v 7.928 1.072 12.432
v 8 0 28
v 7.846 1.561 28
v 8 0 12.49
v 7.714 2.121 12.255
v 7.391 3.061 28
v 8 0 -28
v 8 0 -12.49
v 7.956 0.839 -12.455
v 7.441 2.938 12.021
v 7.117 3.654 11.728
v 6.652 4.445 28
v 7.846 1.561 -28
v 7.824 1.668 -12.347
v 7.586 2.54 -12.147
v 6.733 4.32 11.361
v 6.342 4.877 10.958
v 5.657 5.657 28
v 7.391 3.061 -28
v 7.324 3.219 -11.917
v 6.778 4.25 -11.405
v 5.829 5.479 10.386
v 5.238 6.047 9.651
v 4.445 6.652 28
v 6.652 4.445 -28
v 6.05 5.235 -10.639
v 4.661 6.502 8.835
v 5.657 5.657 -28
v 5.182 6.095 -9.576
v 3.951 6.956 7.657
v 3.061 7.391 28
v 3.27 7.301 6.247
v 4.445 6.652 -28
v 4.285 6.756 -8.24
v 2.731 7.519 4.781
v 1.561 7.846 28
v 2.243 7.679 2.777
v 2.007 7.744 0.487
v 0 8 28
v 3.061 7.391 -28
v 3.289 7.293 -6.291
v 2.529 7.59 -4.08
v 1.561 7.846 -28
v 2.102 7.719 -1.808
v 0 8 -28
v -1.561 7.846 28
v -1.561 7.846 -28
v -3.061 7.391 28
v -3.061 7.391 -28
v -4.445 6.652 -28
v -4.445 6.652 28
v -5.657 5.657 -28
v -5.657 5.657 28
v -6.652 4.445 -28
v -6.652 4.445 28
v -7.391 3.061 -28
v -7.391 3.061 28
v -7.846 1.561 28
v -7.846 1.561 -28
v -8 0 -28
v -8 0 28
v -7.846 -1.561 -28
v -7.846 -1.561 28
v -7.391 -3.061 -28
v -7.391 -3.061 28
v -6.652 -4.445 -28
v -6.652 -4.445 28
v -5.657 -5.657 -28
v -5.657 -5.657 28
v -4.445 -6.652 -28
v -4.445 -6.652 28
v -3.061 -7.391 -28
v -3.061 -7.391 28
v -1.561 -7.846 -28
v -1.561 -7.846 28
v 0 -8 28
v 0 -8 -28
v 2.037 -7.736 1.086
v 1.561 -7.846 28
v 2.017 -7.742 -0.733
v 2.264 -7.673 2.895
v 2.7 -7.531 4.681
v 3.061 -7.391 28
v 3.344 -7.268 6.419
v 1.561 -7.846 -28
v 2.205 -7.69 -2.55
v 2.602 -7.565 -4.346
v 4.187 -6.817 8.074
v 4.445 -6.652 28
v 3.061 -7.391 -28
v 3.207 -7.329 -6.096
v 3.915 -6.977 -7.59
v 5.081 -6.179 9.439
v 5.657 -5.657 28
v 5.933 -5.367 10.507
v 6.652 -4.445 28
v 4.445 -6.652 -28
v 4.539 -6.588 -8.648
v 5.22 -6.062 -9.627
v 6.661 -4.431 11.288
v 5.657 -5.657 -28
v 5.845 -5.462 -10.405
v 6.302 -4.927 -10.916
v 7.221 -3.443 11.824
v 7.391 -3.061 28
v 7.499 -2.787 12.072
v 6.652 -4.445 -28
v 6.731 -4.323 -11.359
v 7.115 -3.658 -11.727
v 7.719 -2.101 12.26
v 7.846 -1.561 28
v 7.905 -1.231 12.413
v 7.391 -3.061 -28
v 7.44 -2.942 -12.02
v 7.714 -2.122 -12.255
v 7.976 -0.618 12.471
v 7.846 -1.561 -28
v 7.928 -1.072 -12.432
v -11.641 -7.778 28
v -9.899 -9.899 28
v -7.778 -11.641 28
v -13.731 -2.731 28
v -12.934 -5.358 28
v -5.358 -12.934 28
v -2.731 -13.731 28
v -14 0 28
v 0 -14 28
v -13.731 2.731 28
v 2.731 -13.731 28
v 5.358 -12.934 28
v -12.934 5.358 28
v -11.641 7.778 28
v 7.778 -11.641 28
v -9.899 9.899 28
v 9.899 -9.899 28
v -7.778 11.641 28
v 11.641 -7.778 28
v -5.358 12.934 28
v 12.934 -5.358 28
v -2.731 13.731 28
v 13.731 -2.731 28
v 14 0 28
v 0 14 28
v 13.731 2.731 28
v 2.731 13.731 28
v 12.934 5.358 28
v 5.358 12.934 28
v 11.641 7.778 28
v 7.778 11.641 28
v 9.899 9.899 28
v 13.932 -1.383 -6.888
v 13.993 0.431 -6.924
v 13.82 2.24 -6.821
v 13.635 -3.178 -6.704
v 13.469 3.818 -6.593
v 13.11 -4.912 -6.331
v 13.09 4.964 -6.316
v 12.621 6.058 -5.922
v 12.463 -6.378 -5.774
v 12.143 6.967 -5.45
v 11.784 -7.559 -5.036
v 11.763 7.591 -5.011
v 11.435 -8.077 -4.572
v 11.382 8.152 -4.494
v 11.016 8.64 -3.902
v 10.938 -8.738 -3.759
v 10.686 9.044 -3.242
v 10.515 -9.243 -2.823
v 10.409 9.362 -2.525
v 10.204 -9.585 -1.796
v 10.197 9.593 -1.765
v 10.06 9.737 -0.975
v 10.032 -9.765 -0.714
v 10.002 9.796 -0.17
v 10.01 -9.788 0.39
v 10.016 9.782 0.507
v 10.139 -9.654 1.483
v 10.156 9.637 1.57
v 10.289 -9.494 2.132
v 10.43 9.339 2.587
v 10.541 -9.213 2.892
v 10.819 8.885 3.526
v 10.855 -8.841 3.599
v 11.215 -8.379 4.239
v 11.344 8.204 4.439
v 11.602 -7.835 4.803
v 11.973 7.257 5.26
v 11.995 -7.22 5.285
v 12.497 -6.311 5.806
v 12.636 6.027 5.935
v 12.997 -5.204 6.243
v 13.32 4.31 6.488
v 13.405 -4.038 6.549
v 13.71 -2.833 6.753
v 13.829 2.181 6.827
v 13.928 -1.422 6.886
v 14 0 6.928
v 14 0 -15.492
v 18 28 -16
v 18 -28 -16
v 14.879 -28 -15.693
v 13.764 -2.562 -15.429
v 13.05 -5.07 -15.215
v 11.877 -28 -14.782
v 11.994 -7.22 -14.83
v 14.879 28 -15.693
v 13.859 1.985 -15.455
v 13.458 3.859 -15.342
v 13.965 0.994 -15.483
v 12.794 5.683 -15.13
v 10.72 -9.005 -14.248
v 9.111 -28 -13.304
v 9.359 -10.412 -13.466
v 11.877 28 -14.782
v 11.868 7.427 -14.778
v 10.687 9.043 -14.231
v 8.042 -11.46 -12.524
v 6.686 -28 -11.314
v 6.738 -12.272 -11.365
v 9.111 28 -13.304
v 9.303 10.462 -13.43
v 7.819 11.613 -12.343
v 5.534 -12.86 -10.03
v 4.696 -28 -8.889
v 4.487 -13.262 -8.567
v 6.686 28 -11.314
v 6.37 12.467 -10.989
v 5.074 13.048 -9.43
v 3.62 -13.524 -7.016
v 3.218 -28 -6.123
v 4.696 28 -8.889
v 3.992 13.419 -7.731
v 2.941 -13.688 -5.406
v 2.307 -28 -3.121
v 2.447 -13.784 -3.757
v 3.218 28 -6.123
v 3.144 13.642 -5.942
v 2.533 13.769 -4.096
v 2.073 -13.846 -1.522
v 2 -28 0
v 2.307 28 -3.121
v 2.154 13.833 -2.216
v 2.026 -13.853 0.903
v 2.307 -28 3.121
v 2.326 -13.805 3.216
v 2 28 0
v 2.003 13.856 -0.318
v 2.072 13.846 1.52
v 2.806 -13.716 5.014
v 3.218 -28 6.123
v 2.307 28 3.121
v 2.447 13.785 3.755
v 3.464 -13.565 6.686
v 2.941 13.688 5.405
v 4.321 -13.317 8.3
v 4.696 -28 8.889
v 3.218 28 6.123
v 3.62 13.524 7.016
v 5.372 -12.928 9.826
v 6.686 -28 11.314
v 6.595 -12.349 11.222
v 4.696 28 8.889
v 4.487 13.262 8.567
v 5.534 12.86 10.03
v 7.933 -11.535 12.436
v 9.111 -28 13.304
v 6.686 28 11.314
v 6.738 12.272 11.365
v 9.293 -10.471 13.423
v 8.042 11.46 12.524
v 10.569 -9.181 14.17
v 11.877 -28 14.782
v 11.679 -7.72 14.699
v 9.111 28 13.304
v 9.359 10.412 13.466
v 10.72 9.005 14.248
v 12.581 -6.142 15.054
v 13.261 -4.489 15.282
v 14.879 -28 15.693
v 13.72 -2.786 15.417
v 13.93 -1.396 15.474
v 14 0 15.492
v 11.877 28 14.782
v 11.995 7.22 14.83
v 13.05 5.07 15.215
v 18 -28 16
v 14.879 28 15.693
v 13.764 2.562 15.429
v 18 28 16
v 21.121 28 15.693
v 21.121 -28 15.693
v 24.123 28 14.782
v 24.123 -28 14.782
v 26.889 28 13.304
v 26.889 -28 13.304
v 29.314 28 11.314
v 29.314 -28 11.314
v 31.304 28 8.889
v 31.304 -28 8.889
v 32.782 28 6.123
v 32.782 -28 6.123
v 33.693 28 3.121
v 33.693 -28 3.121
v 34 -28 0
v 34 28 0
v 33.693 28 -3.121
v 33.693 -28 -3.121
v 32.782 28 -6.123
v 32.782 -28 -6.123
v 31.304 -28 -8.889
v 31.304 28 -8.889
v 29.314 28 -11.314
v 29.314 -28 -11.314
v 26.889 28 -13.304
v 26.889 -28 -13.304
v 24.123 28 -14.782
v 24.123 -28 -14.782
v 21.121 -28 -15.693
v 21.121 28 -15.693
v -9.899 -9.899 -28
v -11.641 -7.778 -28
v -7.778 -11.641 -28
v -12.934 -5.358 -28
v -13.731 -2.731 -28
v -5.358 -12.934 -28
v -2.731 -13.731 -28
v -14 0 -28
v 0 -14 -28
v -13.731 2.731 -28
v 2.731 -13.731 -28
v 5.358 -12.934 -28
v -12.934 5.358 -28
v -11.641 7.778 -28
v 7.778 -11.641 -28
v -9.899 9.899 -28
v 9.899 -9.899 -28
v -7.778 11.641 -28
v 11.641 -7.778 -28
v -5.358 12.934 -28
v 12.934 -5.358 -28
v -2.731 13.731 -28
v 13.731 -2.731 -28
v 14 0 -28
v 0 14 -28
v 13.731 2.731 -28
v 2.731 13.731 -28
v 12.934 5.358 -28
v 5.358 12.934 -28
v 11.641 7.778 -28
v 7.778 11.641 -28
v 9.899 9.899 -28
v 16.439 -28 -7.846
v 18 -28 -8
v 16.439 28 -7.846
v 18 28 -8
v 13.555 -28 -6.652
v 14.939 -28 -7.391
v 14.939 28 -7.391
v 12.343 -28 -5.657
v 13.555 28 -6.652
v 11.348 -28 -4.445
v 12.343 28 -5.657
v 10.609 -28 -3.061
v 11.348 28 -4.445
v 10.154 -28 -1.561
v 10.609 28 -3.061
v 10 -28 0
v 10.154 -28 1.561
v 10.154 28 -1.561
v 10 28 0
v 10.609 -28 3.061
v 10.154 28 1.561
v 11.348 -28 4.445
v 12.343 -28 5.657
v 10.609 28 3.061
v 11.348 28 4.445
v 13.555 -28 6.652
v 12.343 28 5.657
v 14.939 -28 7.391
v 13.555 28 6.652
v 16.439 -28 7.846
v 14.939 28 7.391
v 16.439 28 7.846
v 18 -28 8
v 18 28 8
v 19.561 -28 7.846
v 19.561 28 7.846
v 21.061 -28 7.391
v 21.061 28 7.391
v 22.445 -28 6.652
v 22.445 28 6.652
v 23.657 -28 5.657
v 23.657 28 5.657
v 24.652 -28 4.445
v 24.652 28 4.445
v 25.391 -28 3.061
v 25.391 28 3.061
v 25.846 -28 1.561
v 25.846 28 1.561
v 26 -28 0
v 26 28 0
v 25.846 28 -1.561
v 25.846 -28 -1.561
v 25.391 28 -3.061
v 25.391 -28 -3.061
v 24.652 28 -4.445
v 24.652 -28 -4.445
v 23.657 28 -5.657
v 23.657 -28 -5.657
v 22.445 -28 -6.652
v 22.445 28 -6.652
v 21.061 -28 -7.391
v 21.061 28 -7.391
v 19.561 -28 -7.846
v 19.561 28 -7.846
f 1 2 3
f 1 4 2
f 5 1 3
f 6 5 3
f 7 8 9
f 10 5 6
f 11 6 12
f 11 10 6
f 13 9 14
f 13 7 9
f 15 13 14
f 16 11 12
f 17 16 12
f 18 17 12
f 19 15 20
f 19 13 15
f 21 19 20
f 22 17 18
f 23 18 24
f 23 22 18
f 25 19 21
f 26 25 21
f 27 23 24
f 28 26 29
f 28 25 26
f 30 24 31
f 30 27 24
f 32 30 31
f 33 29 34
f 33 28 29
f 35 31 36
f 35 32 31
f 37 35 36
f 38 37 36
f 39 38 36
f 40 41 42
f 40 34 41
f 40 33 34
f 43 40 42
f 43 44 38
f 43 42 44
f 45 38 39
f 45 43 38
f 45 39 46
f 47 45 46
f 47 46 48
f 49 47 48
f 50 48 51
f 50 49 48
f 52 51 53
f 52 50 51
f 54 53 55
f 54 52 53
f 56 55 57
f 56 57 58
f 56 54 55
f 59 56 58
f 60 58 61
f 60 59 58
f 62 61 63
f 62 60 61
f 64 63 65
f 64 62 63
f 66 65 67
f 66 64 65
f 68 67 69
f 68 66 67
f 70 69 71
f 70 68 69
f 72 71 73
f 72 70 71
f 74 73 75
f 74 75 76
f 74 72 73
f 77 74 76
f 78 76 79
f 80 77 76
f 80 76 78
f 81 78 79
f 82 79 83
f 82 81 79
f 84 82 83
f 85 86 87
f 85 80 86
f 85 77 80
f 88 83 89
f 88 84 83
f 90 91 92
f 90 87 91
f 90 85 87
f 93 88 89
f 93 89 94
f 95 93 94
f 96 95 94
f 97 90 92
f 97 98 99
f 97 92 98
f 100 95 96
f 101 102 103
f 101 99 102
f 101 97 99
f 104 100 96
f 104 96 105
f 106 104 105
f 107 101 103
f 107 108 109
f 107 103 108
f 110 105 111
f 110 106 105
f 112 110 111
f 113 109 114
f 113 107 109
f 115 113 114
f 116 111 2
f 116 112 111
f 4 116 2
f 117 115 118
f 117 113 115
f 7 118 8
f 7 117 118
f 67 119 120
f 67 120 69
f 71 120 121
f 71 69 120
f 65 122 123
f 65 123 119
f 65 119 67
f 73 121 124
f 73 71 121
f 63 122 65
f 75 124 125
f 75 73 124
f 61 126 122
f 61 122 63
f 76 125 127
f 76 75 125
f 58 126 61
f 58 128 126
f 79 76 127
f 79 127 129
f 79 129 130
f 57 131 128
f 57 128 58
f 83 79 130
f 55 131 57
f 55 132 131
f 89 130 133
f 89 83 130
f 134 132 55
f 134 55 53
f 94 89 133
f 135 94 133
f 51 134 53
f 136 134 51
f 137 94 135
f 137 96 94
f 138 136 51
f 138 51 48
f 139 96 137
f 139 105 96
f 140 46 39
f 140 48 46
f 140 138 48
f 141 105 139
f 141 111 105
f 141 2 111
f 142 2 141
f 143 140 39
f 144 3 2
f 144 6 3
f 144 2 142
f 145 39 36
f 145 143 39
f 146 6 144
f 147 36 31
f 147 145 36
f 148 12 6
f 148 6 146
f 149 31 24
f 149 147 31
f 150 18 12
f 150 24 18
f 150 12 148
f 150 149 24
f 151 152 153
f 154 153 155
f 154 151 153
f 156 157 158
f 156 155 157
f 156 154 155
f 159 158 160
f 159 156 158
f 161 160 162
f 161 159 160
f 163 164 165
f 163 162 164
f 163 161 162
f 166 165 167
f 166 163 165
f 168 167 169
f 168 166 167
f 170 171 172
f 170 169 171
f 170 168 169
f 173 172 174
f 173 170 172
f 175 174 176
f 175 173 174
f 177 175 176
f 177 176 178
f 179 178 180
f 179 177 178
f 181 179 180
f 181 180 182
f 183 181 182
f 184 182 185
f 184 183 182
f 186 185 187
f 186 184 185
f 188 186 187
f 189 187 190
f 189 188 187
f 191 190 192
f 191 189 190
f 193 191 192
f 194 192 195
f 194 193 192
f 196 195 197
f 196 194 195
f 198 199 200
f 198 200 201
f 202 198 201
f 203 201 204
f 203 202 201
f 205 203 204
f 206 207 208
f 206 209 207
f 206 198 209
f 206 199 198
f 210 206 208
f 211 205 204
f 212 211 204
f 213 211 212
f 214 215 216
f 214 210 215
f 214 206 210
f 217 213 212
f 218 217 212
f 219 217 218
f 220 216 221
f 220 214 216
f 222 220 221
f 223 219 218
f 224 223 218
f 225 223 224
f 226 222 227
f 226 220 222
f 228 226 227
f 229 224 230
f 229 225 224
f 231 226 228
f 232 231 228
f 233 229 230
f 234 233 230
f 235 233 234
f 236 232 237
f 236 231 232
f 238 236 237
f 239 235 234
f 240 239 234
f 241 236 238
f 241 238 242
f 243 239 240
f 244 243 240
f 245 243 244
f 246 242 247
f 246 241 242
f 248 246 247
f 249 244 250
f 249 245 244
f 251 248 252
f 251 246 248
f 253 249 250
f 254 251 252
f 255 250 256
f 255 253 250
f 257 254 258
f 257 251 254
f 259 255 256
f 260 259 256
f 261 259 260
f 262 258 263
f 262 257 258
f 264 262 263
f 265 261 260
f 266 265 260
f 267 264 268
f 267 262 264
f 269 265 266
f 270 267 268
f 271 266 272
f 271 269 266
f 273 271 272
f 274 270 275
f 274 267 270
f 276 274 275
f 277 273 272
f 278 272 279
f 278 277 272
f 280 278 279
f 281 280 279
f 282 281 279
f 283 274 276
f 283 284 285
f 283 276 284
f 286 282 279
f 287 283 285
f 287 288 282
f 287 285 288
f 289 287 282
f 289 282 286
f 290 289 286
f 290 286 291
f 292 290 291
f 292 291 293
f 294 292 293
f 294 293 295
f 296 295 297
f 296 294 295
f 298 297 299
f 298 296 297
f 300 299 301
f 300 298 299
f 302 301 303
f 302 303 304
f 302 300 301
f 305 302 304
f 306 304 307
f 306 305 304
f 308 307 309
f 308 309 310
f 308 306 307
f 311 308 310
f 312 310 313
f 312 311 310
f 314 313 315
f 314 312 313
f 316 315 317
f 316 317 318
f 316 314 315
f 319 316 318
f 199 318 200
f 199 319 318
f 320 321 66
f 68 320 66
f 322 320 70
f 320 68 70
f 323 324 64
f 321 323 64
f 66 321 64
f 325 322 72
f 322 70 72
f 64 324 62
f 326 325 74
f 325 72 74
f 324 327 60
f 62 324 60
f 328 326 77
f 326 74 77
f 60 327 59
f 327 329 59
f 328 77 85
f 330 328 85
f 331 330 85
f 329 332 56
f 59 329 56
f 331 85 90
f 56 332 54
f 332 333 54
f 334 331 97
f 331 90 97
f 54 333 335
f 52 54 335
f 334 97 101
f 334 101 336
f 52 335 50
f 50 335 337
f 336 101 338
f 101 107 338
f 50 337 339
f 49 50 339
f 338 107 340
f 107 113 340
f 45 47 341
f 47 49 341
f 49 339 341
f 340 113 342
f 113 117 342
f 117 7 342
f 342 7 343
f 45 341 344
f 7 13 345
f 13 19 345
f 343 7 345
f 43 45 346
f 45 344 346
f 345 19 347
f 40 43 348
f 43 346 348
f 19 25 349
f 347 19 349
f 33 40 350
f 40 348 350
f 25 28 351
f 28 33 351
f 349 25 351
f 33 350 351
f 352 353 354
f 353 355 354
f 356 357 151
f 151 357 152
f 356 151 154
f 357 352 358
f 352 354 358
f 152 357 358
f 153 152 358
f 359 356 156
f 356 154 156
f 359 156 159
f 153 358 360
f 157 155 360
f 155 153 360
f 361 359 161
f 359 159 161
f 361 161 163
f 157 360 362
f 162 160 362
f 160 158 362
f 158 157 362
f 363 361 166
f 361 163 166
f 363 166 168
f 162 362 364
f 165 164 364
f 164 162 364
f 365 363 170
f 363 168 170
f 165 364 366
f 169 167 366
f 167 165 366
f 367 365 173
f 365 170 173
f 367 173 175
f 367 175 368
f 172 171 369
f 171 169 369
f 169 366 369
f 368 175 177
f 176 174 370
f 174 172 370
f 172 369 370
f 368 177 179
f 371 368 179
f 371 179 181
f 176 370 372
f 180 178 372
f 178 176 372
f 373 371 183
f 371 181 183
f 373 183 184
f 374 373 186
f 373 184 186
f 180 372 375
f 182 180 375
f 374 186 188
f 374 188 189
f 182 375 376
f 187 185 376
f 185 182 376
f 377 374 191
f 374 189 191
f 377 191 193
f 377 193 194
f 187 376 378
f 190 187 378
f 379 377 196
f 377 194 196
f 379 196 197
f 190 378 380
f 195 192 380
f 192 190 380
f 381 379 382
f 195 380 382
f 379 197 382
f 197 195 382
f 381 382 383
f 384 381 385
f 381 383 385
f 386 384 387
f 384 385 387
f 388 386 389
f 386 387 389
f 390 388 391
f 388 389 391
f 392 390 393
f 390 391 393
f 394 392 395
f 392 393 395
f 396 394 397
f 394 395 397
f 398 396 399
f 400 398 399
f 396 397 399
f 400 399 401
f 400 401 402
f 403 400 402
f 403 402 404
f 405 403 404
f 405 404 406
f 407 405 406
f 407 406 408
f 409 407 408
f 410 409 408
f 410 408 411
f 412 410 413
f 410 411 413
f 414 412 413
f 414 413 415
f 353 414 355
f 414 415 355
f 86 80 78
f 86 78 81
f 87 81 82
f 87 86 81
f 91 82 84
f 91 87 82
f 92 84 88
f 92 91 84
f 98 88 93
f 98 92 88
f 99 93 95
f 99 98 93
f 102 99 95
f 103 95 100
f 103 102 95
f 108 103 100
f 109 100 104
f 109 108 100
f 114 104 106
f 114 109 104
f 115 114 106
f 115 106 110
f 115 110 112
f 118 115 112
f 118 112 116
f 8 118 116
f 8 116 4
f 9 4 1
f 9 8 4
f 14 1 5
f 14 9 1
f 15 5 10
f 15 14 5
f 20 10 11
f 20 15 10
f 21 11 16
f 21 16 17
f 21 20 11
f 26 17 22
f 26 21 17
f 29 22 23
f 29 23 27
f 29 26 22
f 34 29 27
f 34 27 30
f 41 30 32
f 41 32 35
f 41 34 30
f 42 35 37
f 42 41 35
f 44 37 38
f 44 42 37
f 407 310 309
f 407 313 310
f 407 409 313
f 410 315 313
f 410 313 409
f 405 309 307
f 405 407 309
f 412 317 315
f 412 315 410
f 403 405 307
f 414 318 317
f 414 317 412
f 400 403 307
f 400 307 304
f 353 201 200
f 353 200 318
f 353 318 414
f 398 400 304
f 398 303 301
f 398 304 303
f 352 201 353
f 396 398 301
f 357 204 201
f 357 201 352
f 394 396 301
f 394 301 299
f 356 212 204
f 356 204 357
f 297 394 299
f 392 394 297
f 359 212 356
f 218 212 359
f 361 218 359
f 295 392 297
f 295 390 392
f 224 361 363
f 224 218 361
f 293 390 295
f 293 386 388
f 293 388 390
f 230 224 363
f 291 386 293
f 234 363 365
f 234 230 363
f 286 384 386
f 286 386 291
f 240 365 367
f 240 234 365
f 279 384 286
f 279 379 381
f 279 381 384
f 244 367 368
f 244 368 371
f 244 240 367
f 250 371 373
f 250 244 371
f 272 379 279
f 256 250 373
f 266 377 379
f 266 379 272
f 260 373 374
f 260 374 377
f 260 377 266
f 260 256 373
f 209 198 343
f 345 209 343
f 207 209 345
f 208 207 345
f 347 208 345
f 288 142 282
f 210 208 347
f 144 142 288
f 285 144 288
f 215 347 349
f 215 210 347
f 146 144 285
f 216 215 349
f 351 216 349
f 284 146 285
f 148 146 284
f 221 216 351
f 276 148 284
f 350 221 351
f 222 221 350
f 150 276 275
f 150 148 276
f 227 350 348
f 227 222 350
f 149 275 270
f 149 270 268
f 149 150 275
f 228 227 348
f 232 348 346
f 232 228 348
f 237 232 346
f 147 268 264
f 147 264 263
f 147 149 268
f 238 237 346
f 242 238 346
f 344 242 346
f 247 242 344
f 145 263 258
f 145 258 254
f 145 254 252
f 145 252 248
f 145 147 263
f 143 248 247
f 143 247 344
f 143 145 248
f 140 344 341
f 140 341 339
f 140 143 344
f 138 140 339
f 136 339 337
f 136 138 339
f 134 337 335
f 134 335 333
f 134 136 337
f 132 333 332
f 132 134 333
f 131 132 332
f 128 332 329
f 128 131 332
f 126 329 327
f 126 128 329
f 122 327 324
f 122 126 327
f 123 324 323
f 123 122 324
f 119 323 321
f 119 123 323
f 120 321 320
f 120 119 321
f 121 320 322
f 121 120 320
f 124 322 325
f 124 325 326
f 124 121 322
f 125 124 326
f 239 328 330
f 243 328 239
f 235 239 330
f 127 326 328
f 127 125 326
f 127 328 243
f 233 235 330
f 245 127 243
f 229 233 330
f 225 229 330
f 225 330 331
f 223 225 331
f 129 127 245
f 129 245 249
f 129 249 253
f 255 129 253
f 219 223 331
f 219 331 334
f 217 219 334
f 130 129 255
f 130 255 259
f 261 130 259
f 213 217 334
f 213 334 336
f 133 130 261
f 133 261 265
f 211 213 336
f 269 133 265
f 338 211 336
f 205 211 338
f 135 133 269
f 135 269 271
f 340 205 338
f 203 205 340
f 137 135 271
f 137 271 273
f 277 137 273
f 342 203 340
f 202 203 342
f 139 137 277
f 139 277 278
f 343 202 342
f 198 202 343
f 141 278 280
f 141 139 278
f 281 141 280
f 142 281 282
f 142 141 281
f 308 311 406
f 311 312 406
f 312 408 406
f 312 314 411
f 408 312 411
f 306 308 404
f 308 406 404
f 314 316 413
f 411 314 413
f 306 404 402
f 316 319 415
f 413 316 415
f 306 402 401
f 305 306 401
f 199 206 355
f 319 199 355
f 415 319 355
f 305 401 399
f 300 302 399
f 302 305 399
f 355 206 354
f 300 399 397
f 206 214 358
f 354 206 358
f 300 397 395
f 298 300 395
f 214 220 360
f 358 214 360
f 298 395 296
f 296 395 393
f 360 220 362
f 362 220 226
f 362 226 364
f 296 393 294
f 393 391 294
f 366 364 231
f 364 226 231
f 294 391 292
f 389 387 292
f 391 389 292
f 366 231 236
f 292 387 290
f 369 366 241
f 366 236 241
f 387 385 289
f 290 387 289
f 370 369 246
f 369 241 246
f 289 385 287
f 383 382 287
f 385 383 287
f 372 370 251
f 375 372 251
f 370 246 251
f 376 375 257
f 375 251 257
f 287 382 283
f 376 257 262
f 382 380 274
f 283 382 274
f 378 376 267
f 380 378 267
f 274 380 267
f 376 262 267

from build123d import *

# Parameters (mm, degrees)
SKETCH1_R           = 14
SKETCH1_R_2         = 8
BOSS_EXTRUDE1_DEPTH = 28
SKETCH2_W           = 8
SKETCH2_H           = 56
CUT_EXTRUDE1_START  = -56
SKETCH3_R           = 8
CUT_EXTRUDE1_DEPTH  = 56
CUT_EXTRUDE2_START  = -56
SKETCH4_R           = 8
CUT_EXTRUDE2_DEPTH  = 56


with BuildPart() as part:
    # Sketch1 → Boss-Extrude1 (new, symmetric)
    with BuildSketch(Plane.XY):
        Circle(SKETCH1_R)
        Circle(SKETCH1_R_2, mode=Mode.SUBTRACT)
    extrude(amount=BOSS_EXTRUDE1_DEPTH, both=True)

    # Sketch2 → Revolve1 (revolve)
    with BuildSketch(Plane.XY, mode=Mode.PRIVATE) as revolve1_sk:
        with Locations((30, 0)):
            Rectangle(SKETCH2_W, SKETCH2_H)
    revolve(revolve1_sk.sketch.rotate(Axis((18, -19.968284035, 0), (0, 1, 0)), 90), axis=Axis((18, -19.968284035, 0), (0, 1, 0)))

    # Sketch3 → Cut-Extrude1 (cut)
    with BuildSketch(Plane.XY.offset(28).offset(CUT_EXTRUDE1_START)):
        Circle(SKETCH3_R)
    extrude(amount=CUT_EXTRUDE1_DEPTH, mode=Mode.SUBTRACT)

    # Sketch4 → Cut-Extrude2 (cut)
    with BuildSketch(Plane(origin=(0, 28, 0), x_dir=(1, 0, 0), z_dir=(0, 1, 0)).offset(CUT_EXTRUDE2_START)):
        with Locations(Location((18, 0, 0), (0, 0, 90))):
            Circle(SKETCH4_R)
    extrude(amount=CUT_EXTRUDE2_DEPTH, mode=Mode.SUBTRACT)


solid = part.part
